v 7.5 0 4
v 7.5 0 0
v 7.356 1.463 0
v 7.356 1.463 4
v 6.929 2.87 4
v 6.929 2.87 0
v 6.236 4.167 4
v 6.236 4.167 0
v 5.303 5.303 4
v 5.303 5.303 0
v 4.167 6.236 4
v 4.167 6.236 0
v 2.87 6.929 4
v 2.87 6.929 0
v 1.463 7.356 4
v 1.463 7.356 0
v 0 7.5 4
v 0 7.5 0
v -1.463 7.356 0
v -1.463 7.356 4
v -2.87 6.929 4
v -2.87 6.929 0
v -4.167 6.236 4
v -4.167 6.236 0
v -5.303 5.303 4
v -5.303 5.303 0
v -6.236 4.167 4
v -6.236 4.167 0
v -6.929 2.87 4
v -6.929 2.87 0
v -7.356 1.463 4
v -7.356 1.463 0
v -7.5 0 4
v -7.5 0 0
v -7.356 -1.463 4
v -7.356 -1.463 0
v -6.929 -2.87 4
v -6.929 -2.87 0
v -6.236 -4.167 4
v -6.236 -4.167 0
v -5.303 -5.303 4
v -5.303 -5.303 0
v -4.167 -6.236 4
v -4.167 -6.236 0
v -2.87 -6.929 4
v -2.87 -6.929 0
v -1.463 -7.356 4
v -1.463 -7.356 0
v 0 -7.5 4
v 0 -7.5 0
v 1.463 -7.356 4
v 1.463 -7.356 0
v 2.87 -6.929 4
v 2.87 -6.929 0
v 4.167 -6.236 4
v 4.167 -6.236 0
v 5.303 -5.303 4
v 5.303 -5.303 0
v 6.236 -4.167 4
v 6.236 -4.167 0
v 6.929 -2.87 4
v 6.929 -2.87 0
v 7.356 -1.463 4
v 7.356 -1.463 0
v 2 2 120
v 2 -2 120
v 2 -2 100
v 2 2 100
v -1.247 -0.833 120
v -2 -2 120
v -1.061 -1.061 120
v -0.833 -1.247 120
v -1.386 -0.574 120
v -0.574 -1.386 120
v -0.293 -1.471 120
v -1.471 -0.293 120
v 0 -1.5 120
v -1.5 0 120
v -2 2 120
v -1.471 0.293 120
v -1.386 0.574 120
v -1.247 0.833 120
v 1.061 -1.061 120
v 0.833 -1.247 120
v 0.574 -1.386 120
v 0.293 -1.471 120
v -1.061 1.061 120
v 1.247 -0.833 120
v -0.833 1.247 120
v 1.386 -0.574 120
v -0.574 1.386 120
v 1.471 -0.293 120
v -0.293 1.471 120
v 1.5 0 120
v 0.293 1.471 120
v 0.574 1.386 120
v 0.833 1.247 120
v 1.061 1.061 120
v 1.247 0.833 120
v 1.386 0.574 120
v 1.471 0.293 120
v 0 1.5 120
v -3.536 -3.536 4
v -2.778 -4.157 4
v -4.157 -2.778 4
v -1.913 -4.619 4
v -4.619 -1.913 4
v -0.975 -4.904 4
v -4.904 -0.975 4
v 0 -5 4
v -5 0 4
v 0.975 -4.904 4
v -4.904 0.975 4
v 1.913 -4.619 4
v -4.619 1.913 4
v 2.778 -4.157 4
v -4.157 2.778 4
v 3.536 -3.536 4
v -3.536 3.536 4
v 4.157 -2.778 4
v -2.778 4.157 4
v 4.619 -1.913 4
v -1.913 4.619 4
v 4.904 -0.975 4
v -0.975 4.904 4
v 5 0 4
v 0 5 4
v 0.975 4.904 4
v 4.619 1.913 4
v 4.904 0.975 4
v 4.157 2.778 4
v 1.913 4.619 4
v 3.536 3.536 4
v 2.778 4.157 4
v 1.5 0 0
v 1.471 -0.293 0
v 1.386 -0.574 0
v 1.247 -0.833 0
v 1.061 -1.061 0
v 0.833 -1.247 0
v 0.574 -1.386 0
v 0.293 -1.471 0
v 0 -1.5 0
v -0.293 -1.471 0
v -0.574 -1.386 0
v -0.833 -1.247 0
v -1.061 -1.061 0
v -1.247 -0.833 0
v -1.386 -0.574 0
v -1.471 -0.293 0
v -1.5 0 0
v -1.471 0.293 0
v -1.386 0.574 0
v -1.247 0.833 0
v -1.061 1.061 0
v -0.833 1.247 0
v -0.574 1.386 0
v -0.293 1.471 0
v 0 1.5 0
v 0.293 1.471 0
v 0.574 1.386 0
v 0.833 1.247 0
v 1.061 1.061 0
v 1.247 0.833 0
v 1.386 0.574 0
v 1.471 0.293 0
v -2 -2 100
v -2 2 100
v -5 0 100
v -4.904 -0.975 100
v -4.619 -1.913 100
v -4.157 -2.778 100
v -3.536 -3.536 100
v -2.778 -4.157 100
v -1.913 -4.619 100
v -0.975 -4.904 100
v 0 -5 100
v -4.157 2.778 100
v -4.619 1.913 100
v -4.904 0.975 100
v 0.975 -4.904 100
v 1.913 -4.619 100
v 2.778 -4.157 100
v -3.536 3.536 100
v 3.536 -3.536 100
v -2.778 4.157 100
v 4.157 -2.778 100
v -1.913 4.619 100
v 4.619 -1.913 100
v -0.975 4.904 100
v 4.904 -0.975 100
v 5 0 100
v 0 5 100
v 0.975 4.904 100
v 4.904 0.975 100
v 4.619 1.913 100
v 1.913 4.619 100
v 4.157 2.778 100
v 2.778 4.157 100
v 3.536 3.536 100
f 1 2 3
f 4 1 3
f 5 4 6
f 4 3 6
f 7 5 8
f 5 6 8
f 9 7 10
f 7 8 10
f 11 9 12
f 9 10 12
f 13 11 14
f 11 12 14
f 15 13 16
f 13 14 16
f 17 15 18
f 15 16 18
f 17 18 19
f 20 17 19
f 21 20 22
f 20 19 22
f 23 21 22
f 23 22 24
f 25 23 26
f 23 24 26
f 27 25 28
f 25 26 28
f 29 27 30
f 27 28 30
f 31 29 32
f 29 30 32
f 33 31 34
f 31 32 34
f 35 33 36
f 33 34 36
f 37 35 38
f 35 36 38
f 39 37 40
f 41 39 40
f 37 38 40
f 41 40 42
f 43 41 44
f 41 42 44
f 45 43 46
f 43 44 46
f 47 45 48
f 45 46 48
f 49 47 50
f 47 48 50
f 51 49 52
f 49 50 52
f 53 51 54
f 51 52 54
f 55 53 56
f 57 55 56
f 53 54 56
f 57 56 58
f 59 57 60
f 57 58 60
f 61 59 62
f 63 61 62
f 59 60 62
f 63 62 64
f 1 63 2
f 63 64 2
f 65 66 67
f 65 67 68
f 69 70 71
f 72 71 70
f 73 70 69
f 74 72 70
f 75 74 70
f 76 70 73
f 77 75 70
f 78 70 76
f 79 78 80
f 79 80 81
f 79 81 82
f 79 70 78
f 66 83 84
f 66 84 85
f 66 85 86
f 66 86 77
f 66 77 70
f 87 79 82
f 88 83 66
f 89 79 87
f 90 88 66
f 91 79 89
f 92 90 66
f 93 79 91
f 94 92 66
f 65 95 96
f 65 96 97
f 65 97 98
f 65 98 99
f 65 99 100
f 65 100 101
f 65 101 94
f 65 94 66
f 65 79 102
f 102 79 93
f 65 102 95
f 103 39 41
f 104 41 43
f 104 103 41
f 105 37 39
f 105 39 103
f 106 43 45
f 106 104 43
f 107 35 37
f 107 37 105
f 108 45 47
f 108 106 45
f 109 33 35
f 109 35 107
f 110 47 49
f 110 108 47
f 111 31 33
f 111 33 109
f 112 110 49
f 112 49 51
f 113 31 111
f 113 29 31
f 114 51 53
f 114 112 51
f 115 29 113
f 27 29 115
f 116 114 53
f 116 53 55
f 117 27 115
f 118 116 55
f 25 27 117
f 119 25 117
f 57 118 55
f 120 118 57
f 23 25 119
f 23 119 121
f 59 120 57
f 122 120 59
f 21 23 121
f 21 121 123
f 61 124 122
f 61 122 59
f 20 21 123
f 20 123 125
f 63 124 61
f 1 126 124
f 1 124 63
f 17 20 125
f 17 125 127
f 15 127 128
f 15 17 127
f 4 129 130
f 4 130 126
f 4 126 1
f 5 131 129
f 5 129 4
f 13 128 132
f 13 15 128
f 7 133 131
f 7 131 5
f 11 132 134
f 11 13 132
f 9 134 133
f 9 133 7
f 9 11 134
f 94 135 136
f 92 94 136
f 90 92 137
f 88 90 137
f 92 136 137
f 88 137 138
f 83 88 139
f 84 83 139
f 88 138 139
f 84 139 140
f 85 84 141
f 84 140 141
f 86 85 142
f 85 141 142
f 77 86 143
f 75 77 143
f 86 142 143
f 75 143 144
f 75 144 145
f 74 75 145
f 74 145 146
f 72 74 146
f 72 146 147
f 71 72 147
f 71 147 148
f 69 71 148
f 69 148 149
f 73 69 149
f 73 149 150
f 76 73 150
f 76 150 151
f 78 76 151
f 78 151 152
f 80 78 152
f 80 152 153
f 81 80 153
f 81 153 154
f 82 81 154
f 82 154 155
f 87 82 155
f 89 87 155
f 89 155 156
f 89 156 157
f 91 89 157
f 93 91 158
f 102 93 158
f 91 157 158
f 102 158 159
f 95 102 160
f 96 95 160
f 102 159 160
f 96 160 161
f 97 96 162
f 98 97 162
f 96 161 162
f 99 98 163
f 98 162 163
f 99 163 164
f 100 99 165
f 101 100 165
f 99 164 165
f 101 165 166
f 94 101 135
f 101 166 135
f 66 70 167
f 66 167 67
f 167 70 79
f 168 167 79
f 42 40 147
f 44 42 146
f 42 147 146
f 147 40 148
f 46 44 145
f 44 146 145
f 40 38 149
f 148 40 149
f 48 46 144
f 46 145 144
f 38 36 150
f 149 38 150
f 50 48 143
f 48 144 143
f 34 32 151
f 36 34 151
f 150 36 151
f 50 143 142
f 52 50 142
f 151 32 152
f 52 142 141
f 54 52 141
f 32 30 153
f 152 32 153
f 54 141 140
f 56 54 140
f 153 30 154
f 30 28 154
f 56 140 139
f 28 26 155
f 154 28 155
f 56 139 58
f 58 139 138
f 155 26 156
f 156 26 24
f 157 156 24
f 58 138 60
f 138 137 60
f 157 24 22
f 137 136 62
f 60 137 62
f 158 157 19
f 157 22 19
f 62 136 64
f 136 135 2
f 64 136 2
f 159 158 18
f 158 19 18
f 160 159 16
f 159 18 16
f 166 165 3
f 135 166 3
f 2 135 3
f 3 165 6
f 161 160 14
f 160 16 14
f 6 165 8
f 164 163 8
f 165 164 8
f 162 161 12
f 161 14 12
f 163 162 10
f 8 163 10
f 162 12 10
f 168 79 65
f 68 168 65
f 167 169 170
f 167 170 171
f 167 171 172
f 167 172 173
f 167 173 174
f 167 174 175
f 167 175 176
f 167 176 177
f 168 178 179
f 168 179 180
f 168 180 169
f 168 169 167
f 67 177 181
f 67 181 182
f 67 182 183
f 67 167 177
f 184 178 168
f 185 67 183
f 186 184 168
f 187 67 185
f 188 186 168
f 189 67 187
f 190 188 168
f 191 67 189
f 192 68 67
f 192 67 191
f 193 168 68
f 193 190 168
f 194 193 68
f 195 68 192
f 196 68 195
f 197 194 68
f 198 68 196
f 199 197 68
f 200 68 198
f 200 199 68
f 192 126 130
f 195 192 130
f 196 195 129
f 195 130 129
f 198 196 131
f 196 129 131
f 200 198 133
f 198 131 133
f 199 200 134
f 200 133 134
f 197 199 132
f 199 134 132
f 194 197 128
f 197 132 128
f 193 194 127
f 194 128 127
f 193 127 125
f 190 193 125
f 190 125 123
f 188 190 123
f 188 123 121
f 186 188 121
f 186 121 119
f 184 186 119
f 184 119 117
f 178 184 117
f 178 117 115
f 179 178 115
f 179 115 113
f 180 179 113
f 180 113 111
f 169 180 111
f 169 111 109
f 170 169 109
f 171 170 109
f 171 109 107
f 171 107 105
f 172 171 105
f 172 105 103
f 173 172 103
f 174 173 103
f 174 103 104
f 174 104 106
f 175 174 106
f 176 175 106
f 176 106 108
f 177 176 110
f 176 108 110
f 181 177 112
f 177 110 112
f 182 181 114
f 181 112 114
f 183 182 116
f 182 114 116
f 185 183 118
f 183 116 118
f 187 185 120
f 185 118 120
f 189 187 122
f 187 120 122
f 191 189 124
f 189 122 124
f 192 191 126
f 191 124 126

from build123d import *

# Parameters (mm, degrees)
F0_R     = 7.5
F1_DEPTH = 4
F2_R     = 5
F3_DEPTH = 100
F4_W     = 4
F4_H     = 4
F5_DEPTH = 20
F6_R     = 1.5
F7_DEPTH = 122.4


with BuildPart() as f1:
    # F0 (on Top) → F1 (new body)
    with BuildSketch(Plane.XY):
        Circle(F0_R)
    extrude(amount=F1_DEPTH)

    # F2 (on Top) → F3 (join)
    with BuildSketch(Plane.XY):
        Circle(F2_R)
    extrude(amount=F3_DEPTH)

    # F4 (on face) → F5 (join)
    with BuildSketch(Plane.XY.offset(100)):
        Rectangle(F4_W, F4_H)
    extrude(amount=F5_DEPTH)

    # F6 (on face) → F7 (cut)
    with BuildSketch(Plane(origin=(0, 0, 0), x_dir=(1, 0, 0), z_dir=(0, 0, -1))):
        Circle(F6_R)
    extrude(amount=-F7_DEPTH, mode=Mode.SUBTRACT)


solid = f1.part
